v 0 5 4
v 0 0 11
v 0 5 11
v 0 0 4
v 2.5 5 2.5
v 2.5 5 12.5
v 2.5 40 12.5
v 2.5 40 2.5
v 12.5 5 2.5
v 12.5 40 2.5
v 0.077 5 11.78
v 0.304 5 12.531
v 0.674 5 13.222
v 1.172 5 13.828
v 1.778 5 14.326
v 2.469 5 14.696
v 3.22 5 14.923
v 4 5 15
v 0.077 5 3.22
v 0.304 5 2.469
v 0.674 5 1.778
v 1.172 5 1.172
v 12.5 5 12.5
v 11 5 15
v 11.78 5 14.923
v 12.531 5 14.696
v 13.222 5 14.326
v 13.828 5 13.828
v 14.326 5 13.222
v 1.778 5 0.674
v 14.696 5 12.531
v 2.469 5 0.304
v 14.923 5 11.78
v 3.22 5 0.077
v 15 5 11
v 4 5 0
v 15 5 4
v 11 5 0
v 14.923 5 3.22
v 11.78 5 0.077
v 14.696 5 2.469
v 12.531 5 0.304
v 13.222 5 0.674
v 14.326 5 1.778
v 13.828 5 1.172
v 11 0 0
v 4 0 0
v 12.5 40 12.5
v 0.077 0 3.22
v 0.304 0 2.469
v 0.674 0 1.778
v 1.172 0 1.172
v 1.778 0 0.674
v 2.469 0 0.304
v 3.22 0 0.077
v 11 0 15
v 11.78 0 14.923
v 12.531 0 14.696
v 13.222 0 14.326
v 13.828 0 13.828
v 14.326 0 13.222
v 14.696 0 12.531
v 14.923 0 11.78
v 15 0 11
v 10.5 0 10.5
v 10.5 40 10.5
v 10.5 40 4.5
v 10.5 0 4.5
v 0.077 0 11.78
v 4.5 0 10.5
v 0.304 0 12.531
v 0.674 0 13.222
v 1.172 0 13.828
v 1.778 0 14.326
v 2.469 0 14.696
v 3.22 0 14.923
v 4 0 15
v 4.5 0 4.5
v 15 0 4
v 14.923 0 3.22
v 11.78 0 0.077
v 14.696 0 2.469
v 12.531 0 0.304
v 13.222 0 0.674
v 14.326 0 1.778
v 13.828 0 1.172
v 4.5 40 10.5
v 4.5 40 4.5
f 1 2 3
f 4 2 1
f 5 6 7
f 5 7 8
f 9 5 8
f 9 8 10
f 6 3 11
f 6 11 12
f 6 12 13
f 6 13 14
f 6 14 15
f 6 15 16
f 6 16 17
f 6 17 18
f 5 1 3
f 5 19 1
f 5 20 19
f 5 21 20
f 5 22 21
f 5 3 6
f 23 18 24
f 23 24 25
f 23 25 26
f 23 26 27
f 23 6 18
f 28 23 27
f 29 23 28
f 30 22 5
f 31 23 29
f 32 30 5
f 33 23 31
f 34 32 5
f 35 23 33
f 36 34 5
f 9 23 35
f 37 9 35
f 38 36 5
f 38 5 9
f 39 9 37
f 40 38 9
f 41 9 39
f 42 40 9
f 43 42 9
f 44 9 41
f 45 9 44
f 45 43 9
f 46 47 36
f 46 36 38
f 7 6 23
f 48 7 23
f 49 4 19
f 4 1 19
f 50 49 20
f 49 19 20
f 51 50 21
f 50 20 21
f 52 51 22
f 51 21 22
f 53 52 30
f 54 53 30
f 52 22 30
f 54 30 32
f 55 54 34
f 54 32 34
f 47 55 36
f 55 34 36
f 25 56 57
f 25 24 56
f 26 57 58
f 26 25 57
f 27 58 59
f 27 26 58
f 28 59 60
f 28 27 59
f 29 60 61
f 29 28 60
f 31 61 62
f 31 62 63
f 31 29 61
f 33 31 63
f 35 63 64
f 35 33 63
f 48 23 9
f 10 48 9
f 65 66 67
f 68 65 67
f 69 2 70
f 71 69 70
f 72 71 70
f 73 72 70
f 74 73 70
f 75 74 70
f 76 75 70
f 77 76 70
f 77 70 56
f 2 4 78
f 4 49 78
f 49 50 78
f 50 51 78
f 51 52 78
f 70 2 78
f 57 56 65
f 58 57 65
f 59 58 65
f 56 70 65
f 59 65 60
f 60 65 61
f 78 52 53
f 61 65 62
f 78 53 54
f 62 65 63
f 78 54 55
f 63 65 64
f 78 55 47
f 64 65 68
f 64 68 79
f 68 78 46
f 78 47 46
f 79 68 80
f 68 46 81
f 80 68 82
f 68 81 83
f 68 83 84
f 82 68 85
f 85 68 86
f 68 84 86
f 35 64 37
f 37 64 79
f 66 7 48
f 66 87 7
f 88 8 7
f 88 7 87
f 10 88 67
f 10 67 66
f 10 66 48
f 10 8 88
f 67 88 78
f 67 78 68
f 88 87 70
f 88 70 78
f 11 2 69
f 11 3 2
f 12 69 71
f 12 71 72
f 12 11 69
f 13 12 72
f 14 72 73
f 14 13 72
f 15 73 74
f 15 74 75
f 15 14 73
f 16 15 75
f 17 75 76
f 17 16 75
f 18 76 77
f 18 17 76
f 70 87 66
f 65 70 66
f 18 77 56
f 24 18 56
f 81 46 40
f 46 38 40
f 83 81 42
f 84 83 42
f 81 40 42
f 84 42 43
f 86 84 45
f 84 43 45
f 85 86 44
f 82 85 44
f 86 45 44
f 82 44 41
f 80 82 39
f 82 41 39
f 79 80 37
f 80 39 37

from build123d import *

# Parameters (mm, degrees)
ESBO_O2_W                = 15
ESBO_O2_H                = 15
RESSALTO_EXTRUS_O2_DEPTH = 5
ESBO_O3_W                = 10
ESBO_O3_H                = 10
RESSALTO_EXTRUS_O3_DEPTH = 35
FILETE1_R                = 4
ESBO_O4_W                = 6
ESBO_O4_H                = 6
CORTE_EXTRUS_O1_DEPTH    = 46.276925691


with BuildPart() as part:
    # Esboço2 → Ressalto-extrusão2 (new body)
    with BuildSketch(Plane(origin=(0, 0, 0), x_dir=(1, 0, 0), z_dir=(0, 1, 0))):
        with Locations((7.5, -7.5)):
            Rectangle(ESBO_O2_W, ESBO_O2_H)
    extrude(amount=RESSALTO_EXTRUS_O2_DEPTH)

    # Esboço3 → Ressalto-extrusão3 (add)
    with BuildSketch(Plane(origin=(0, 5, 0), x_dir=(1, 0, 0), z_dir=(0, 1, 0))):
        with Locations((7.5, -7.5)):
            Rectangle(ESBO_O3_W, ESBO_O3_H)
    extrude(amount=RESSALTO_EXTRUS_O3_DEPTH)

    # Filete1
    filete1_edges = [part.edges().sort_by_distance(p)[0] for p in [
        (0, 2.5, 0),
        (15, 2.5, 0),
        (15, 2.5, 15),
        (0, 2.5, 15),
    ]]
    fillet(filete1_edges, radius=FILETE1_R)

    # Esboço4 → Corte-extrusão1 (cut, through all)
    with BuildSketch(Plane(origin=(0, 40, 0), x_dir=(1, 0, 0), z_dir=(0, 1, 0))):
        with Locations((7.5, -7.5)):
            Rectangle(ESBO_O4_W, ESBO_O4_H)
    extrude(amount=-CORTE_EXTRUS_O1_DEPTH, mode=Mode.SUBTRACT)


solid = part.part
